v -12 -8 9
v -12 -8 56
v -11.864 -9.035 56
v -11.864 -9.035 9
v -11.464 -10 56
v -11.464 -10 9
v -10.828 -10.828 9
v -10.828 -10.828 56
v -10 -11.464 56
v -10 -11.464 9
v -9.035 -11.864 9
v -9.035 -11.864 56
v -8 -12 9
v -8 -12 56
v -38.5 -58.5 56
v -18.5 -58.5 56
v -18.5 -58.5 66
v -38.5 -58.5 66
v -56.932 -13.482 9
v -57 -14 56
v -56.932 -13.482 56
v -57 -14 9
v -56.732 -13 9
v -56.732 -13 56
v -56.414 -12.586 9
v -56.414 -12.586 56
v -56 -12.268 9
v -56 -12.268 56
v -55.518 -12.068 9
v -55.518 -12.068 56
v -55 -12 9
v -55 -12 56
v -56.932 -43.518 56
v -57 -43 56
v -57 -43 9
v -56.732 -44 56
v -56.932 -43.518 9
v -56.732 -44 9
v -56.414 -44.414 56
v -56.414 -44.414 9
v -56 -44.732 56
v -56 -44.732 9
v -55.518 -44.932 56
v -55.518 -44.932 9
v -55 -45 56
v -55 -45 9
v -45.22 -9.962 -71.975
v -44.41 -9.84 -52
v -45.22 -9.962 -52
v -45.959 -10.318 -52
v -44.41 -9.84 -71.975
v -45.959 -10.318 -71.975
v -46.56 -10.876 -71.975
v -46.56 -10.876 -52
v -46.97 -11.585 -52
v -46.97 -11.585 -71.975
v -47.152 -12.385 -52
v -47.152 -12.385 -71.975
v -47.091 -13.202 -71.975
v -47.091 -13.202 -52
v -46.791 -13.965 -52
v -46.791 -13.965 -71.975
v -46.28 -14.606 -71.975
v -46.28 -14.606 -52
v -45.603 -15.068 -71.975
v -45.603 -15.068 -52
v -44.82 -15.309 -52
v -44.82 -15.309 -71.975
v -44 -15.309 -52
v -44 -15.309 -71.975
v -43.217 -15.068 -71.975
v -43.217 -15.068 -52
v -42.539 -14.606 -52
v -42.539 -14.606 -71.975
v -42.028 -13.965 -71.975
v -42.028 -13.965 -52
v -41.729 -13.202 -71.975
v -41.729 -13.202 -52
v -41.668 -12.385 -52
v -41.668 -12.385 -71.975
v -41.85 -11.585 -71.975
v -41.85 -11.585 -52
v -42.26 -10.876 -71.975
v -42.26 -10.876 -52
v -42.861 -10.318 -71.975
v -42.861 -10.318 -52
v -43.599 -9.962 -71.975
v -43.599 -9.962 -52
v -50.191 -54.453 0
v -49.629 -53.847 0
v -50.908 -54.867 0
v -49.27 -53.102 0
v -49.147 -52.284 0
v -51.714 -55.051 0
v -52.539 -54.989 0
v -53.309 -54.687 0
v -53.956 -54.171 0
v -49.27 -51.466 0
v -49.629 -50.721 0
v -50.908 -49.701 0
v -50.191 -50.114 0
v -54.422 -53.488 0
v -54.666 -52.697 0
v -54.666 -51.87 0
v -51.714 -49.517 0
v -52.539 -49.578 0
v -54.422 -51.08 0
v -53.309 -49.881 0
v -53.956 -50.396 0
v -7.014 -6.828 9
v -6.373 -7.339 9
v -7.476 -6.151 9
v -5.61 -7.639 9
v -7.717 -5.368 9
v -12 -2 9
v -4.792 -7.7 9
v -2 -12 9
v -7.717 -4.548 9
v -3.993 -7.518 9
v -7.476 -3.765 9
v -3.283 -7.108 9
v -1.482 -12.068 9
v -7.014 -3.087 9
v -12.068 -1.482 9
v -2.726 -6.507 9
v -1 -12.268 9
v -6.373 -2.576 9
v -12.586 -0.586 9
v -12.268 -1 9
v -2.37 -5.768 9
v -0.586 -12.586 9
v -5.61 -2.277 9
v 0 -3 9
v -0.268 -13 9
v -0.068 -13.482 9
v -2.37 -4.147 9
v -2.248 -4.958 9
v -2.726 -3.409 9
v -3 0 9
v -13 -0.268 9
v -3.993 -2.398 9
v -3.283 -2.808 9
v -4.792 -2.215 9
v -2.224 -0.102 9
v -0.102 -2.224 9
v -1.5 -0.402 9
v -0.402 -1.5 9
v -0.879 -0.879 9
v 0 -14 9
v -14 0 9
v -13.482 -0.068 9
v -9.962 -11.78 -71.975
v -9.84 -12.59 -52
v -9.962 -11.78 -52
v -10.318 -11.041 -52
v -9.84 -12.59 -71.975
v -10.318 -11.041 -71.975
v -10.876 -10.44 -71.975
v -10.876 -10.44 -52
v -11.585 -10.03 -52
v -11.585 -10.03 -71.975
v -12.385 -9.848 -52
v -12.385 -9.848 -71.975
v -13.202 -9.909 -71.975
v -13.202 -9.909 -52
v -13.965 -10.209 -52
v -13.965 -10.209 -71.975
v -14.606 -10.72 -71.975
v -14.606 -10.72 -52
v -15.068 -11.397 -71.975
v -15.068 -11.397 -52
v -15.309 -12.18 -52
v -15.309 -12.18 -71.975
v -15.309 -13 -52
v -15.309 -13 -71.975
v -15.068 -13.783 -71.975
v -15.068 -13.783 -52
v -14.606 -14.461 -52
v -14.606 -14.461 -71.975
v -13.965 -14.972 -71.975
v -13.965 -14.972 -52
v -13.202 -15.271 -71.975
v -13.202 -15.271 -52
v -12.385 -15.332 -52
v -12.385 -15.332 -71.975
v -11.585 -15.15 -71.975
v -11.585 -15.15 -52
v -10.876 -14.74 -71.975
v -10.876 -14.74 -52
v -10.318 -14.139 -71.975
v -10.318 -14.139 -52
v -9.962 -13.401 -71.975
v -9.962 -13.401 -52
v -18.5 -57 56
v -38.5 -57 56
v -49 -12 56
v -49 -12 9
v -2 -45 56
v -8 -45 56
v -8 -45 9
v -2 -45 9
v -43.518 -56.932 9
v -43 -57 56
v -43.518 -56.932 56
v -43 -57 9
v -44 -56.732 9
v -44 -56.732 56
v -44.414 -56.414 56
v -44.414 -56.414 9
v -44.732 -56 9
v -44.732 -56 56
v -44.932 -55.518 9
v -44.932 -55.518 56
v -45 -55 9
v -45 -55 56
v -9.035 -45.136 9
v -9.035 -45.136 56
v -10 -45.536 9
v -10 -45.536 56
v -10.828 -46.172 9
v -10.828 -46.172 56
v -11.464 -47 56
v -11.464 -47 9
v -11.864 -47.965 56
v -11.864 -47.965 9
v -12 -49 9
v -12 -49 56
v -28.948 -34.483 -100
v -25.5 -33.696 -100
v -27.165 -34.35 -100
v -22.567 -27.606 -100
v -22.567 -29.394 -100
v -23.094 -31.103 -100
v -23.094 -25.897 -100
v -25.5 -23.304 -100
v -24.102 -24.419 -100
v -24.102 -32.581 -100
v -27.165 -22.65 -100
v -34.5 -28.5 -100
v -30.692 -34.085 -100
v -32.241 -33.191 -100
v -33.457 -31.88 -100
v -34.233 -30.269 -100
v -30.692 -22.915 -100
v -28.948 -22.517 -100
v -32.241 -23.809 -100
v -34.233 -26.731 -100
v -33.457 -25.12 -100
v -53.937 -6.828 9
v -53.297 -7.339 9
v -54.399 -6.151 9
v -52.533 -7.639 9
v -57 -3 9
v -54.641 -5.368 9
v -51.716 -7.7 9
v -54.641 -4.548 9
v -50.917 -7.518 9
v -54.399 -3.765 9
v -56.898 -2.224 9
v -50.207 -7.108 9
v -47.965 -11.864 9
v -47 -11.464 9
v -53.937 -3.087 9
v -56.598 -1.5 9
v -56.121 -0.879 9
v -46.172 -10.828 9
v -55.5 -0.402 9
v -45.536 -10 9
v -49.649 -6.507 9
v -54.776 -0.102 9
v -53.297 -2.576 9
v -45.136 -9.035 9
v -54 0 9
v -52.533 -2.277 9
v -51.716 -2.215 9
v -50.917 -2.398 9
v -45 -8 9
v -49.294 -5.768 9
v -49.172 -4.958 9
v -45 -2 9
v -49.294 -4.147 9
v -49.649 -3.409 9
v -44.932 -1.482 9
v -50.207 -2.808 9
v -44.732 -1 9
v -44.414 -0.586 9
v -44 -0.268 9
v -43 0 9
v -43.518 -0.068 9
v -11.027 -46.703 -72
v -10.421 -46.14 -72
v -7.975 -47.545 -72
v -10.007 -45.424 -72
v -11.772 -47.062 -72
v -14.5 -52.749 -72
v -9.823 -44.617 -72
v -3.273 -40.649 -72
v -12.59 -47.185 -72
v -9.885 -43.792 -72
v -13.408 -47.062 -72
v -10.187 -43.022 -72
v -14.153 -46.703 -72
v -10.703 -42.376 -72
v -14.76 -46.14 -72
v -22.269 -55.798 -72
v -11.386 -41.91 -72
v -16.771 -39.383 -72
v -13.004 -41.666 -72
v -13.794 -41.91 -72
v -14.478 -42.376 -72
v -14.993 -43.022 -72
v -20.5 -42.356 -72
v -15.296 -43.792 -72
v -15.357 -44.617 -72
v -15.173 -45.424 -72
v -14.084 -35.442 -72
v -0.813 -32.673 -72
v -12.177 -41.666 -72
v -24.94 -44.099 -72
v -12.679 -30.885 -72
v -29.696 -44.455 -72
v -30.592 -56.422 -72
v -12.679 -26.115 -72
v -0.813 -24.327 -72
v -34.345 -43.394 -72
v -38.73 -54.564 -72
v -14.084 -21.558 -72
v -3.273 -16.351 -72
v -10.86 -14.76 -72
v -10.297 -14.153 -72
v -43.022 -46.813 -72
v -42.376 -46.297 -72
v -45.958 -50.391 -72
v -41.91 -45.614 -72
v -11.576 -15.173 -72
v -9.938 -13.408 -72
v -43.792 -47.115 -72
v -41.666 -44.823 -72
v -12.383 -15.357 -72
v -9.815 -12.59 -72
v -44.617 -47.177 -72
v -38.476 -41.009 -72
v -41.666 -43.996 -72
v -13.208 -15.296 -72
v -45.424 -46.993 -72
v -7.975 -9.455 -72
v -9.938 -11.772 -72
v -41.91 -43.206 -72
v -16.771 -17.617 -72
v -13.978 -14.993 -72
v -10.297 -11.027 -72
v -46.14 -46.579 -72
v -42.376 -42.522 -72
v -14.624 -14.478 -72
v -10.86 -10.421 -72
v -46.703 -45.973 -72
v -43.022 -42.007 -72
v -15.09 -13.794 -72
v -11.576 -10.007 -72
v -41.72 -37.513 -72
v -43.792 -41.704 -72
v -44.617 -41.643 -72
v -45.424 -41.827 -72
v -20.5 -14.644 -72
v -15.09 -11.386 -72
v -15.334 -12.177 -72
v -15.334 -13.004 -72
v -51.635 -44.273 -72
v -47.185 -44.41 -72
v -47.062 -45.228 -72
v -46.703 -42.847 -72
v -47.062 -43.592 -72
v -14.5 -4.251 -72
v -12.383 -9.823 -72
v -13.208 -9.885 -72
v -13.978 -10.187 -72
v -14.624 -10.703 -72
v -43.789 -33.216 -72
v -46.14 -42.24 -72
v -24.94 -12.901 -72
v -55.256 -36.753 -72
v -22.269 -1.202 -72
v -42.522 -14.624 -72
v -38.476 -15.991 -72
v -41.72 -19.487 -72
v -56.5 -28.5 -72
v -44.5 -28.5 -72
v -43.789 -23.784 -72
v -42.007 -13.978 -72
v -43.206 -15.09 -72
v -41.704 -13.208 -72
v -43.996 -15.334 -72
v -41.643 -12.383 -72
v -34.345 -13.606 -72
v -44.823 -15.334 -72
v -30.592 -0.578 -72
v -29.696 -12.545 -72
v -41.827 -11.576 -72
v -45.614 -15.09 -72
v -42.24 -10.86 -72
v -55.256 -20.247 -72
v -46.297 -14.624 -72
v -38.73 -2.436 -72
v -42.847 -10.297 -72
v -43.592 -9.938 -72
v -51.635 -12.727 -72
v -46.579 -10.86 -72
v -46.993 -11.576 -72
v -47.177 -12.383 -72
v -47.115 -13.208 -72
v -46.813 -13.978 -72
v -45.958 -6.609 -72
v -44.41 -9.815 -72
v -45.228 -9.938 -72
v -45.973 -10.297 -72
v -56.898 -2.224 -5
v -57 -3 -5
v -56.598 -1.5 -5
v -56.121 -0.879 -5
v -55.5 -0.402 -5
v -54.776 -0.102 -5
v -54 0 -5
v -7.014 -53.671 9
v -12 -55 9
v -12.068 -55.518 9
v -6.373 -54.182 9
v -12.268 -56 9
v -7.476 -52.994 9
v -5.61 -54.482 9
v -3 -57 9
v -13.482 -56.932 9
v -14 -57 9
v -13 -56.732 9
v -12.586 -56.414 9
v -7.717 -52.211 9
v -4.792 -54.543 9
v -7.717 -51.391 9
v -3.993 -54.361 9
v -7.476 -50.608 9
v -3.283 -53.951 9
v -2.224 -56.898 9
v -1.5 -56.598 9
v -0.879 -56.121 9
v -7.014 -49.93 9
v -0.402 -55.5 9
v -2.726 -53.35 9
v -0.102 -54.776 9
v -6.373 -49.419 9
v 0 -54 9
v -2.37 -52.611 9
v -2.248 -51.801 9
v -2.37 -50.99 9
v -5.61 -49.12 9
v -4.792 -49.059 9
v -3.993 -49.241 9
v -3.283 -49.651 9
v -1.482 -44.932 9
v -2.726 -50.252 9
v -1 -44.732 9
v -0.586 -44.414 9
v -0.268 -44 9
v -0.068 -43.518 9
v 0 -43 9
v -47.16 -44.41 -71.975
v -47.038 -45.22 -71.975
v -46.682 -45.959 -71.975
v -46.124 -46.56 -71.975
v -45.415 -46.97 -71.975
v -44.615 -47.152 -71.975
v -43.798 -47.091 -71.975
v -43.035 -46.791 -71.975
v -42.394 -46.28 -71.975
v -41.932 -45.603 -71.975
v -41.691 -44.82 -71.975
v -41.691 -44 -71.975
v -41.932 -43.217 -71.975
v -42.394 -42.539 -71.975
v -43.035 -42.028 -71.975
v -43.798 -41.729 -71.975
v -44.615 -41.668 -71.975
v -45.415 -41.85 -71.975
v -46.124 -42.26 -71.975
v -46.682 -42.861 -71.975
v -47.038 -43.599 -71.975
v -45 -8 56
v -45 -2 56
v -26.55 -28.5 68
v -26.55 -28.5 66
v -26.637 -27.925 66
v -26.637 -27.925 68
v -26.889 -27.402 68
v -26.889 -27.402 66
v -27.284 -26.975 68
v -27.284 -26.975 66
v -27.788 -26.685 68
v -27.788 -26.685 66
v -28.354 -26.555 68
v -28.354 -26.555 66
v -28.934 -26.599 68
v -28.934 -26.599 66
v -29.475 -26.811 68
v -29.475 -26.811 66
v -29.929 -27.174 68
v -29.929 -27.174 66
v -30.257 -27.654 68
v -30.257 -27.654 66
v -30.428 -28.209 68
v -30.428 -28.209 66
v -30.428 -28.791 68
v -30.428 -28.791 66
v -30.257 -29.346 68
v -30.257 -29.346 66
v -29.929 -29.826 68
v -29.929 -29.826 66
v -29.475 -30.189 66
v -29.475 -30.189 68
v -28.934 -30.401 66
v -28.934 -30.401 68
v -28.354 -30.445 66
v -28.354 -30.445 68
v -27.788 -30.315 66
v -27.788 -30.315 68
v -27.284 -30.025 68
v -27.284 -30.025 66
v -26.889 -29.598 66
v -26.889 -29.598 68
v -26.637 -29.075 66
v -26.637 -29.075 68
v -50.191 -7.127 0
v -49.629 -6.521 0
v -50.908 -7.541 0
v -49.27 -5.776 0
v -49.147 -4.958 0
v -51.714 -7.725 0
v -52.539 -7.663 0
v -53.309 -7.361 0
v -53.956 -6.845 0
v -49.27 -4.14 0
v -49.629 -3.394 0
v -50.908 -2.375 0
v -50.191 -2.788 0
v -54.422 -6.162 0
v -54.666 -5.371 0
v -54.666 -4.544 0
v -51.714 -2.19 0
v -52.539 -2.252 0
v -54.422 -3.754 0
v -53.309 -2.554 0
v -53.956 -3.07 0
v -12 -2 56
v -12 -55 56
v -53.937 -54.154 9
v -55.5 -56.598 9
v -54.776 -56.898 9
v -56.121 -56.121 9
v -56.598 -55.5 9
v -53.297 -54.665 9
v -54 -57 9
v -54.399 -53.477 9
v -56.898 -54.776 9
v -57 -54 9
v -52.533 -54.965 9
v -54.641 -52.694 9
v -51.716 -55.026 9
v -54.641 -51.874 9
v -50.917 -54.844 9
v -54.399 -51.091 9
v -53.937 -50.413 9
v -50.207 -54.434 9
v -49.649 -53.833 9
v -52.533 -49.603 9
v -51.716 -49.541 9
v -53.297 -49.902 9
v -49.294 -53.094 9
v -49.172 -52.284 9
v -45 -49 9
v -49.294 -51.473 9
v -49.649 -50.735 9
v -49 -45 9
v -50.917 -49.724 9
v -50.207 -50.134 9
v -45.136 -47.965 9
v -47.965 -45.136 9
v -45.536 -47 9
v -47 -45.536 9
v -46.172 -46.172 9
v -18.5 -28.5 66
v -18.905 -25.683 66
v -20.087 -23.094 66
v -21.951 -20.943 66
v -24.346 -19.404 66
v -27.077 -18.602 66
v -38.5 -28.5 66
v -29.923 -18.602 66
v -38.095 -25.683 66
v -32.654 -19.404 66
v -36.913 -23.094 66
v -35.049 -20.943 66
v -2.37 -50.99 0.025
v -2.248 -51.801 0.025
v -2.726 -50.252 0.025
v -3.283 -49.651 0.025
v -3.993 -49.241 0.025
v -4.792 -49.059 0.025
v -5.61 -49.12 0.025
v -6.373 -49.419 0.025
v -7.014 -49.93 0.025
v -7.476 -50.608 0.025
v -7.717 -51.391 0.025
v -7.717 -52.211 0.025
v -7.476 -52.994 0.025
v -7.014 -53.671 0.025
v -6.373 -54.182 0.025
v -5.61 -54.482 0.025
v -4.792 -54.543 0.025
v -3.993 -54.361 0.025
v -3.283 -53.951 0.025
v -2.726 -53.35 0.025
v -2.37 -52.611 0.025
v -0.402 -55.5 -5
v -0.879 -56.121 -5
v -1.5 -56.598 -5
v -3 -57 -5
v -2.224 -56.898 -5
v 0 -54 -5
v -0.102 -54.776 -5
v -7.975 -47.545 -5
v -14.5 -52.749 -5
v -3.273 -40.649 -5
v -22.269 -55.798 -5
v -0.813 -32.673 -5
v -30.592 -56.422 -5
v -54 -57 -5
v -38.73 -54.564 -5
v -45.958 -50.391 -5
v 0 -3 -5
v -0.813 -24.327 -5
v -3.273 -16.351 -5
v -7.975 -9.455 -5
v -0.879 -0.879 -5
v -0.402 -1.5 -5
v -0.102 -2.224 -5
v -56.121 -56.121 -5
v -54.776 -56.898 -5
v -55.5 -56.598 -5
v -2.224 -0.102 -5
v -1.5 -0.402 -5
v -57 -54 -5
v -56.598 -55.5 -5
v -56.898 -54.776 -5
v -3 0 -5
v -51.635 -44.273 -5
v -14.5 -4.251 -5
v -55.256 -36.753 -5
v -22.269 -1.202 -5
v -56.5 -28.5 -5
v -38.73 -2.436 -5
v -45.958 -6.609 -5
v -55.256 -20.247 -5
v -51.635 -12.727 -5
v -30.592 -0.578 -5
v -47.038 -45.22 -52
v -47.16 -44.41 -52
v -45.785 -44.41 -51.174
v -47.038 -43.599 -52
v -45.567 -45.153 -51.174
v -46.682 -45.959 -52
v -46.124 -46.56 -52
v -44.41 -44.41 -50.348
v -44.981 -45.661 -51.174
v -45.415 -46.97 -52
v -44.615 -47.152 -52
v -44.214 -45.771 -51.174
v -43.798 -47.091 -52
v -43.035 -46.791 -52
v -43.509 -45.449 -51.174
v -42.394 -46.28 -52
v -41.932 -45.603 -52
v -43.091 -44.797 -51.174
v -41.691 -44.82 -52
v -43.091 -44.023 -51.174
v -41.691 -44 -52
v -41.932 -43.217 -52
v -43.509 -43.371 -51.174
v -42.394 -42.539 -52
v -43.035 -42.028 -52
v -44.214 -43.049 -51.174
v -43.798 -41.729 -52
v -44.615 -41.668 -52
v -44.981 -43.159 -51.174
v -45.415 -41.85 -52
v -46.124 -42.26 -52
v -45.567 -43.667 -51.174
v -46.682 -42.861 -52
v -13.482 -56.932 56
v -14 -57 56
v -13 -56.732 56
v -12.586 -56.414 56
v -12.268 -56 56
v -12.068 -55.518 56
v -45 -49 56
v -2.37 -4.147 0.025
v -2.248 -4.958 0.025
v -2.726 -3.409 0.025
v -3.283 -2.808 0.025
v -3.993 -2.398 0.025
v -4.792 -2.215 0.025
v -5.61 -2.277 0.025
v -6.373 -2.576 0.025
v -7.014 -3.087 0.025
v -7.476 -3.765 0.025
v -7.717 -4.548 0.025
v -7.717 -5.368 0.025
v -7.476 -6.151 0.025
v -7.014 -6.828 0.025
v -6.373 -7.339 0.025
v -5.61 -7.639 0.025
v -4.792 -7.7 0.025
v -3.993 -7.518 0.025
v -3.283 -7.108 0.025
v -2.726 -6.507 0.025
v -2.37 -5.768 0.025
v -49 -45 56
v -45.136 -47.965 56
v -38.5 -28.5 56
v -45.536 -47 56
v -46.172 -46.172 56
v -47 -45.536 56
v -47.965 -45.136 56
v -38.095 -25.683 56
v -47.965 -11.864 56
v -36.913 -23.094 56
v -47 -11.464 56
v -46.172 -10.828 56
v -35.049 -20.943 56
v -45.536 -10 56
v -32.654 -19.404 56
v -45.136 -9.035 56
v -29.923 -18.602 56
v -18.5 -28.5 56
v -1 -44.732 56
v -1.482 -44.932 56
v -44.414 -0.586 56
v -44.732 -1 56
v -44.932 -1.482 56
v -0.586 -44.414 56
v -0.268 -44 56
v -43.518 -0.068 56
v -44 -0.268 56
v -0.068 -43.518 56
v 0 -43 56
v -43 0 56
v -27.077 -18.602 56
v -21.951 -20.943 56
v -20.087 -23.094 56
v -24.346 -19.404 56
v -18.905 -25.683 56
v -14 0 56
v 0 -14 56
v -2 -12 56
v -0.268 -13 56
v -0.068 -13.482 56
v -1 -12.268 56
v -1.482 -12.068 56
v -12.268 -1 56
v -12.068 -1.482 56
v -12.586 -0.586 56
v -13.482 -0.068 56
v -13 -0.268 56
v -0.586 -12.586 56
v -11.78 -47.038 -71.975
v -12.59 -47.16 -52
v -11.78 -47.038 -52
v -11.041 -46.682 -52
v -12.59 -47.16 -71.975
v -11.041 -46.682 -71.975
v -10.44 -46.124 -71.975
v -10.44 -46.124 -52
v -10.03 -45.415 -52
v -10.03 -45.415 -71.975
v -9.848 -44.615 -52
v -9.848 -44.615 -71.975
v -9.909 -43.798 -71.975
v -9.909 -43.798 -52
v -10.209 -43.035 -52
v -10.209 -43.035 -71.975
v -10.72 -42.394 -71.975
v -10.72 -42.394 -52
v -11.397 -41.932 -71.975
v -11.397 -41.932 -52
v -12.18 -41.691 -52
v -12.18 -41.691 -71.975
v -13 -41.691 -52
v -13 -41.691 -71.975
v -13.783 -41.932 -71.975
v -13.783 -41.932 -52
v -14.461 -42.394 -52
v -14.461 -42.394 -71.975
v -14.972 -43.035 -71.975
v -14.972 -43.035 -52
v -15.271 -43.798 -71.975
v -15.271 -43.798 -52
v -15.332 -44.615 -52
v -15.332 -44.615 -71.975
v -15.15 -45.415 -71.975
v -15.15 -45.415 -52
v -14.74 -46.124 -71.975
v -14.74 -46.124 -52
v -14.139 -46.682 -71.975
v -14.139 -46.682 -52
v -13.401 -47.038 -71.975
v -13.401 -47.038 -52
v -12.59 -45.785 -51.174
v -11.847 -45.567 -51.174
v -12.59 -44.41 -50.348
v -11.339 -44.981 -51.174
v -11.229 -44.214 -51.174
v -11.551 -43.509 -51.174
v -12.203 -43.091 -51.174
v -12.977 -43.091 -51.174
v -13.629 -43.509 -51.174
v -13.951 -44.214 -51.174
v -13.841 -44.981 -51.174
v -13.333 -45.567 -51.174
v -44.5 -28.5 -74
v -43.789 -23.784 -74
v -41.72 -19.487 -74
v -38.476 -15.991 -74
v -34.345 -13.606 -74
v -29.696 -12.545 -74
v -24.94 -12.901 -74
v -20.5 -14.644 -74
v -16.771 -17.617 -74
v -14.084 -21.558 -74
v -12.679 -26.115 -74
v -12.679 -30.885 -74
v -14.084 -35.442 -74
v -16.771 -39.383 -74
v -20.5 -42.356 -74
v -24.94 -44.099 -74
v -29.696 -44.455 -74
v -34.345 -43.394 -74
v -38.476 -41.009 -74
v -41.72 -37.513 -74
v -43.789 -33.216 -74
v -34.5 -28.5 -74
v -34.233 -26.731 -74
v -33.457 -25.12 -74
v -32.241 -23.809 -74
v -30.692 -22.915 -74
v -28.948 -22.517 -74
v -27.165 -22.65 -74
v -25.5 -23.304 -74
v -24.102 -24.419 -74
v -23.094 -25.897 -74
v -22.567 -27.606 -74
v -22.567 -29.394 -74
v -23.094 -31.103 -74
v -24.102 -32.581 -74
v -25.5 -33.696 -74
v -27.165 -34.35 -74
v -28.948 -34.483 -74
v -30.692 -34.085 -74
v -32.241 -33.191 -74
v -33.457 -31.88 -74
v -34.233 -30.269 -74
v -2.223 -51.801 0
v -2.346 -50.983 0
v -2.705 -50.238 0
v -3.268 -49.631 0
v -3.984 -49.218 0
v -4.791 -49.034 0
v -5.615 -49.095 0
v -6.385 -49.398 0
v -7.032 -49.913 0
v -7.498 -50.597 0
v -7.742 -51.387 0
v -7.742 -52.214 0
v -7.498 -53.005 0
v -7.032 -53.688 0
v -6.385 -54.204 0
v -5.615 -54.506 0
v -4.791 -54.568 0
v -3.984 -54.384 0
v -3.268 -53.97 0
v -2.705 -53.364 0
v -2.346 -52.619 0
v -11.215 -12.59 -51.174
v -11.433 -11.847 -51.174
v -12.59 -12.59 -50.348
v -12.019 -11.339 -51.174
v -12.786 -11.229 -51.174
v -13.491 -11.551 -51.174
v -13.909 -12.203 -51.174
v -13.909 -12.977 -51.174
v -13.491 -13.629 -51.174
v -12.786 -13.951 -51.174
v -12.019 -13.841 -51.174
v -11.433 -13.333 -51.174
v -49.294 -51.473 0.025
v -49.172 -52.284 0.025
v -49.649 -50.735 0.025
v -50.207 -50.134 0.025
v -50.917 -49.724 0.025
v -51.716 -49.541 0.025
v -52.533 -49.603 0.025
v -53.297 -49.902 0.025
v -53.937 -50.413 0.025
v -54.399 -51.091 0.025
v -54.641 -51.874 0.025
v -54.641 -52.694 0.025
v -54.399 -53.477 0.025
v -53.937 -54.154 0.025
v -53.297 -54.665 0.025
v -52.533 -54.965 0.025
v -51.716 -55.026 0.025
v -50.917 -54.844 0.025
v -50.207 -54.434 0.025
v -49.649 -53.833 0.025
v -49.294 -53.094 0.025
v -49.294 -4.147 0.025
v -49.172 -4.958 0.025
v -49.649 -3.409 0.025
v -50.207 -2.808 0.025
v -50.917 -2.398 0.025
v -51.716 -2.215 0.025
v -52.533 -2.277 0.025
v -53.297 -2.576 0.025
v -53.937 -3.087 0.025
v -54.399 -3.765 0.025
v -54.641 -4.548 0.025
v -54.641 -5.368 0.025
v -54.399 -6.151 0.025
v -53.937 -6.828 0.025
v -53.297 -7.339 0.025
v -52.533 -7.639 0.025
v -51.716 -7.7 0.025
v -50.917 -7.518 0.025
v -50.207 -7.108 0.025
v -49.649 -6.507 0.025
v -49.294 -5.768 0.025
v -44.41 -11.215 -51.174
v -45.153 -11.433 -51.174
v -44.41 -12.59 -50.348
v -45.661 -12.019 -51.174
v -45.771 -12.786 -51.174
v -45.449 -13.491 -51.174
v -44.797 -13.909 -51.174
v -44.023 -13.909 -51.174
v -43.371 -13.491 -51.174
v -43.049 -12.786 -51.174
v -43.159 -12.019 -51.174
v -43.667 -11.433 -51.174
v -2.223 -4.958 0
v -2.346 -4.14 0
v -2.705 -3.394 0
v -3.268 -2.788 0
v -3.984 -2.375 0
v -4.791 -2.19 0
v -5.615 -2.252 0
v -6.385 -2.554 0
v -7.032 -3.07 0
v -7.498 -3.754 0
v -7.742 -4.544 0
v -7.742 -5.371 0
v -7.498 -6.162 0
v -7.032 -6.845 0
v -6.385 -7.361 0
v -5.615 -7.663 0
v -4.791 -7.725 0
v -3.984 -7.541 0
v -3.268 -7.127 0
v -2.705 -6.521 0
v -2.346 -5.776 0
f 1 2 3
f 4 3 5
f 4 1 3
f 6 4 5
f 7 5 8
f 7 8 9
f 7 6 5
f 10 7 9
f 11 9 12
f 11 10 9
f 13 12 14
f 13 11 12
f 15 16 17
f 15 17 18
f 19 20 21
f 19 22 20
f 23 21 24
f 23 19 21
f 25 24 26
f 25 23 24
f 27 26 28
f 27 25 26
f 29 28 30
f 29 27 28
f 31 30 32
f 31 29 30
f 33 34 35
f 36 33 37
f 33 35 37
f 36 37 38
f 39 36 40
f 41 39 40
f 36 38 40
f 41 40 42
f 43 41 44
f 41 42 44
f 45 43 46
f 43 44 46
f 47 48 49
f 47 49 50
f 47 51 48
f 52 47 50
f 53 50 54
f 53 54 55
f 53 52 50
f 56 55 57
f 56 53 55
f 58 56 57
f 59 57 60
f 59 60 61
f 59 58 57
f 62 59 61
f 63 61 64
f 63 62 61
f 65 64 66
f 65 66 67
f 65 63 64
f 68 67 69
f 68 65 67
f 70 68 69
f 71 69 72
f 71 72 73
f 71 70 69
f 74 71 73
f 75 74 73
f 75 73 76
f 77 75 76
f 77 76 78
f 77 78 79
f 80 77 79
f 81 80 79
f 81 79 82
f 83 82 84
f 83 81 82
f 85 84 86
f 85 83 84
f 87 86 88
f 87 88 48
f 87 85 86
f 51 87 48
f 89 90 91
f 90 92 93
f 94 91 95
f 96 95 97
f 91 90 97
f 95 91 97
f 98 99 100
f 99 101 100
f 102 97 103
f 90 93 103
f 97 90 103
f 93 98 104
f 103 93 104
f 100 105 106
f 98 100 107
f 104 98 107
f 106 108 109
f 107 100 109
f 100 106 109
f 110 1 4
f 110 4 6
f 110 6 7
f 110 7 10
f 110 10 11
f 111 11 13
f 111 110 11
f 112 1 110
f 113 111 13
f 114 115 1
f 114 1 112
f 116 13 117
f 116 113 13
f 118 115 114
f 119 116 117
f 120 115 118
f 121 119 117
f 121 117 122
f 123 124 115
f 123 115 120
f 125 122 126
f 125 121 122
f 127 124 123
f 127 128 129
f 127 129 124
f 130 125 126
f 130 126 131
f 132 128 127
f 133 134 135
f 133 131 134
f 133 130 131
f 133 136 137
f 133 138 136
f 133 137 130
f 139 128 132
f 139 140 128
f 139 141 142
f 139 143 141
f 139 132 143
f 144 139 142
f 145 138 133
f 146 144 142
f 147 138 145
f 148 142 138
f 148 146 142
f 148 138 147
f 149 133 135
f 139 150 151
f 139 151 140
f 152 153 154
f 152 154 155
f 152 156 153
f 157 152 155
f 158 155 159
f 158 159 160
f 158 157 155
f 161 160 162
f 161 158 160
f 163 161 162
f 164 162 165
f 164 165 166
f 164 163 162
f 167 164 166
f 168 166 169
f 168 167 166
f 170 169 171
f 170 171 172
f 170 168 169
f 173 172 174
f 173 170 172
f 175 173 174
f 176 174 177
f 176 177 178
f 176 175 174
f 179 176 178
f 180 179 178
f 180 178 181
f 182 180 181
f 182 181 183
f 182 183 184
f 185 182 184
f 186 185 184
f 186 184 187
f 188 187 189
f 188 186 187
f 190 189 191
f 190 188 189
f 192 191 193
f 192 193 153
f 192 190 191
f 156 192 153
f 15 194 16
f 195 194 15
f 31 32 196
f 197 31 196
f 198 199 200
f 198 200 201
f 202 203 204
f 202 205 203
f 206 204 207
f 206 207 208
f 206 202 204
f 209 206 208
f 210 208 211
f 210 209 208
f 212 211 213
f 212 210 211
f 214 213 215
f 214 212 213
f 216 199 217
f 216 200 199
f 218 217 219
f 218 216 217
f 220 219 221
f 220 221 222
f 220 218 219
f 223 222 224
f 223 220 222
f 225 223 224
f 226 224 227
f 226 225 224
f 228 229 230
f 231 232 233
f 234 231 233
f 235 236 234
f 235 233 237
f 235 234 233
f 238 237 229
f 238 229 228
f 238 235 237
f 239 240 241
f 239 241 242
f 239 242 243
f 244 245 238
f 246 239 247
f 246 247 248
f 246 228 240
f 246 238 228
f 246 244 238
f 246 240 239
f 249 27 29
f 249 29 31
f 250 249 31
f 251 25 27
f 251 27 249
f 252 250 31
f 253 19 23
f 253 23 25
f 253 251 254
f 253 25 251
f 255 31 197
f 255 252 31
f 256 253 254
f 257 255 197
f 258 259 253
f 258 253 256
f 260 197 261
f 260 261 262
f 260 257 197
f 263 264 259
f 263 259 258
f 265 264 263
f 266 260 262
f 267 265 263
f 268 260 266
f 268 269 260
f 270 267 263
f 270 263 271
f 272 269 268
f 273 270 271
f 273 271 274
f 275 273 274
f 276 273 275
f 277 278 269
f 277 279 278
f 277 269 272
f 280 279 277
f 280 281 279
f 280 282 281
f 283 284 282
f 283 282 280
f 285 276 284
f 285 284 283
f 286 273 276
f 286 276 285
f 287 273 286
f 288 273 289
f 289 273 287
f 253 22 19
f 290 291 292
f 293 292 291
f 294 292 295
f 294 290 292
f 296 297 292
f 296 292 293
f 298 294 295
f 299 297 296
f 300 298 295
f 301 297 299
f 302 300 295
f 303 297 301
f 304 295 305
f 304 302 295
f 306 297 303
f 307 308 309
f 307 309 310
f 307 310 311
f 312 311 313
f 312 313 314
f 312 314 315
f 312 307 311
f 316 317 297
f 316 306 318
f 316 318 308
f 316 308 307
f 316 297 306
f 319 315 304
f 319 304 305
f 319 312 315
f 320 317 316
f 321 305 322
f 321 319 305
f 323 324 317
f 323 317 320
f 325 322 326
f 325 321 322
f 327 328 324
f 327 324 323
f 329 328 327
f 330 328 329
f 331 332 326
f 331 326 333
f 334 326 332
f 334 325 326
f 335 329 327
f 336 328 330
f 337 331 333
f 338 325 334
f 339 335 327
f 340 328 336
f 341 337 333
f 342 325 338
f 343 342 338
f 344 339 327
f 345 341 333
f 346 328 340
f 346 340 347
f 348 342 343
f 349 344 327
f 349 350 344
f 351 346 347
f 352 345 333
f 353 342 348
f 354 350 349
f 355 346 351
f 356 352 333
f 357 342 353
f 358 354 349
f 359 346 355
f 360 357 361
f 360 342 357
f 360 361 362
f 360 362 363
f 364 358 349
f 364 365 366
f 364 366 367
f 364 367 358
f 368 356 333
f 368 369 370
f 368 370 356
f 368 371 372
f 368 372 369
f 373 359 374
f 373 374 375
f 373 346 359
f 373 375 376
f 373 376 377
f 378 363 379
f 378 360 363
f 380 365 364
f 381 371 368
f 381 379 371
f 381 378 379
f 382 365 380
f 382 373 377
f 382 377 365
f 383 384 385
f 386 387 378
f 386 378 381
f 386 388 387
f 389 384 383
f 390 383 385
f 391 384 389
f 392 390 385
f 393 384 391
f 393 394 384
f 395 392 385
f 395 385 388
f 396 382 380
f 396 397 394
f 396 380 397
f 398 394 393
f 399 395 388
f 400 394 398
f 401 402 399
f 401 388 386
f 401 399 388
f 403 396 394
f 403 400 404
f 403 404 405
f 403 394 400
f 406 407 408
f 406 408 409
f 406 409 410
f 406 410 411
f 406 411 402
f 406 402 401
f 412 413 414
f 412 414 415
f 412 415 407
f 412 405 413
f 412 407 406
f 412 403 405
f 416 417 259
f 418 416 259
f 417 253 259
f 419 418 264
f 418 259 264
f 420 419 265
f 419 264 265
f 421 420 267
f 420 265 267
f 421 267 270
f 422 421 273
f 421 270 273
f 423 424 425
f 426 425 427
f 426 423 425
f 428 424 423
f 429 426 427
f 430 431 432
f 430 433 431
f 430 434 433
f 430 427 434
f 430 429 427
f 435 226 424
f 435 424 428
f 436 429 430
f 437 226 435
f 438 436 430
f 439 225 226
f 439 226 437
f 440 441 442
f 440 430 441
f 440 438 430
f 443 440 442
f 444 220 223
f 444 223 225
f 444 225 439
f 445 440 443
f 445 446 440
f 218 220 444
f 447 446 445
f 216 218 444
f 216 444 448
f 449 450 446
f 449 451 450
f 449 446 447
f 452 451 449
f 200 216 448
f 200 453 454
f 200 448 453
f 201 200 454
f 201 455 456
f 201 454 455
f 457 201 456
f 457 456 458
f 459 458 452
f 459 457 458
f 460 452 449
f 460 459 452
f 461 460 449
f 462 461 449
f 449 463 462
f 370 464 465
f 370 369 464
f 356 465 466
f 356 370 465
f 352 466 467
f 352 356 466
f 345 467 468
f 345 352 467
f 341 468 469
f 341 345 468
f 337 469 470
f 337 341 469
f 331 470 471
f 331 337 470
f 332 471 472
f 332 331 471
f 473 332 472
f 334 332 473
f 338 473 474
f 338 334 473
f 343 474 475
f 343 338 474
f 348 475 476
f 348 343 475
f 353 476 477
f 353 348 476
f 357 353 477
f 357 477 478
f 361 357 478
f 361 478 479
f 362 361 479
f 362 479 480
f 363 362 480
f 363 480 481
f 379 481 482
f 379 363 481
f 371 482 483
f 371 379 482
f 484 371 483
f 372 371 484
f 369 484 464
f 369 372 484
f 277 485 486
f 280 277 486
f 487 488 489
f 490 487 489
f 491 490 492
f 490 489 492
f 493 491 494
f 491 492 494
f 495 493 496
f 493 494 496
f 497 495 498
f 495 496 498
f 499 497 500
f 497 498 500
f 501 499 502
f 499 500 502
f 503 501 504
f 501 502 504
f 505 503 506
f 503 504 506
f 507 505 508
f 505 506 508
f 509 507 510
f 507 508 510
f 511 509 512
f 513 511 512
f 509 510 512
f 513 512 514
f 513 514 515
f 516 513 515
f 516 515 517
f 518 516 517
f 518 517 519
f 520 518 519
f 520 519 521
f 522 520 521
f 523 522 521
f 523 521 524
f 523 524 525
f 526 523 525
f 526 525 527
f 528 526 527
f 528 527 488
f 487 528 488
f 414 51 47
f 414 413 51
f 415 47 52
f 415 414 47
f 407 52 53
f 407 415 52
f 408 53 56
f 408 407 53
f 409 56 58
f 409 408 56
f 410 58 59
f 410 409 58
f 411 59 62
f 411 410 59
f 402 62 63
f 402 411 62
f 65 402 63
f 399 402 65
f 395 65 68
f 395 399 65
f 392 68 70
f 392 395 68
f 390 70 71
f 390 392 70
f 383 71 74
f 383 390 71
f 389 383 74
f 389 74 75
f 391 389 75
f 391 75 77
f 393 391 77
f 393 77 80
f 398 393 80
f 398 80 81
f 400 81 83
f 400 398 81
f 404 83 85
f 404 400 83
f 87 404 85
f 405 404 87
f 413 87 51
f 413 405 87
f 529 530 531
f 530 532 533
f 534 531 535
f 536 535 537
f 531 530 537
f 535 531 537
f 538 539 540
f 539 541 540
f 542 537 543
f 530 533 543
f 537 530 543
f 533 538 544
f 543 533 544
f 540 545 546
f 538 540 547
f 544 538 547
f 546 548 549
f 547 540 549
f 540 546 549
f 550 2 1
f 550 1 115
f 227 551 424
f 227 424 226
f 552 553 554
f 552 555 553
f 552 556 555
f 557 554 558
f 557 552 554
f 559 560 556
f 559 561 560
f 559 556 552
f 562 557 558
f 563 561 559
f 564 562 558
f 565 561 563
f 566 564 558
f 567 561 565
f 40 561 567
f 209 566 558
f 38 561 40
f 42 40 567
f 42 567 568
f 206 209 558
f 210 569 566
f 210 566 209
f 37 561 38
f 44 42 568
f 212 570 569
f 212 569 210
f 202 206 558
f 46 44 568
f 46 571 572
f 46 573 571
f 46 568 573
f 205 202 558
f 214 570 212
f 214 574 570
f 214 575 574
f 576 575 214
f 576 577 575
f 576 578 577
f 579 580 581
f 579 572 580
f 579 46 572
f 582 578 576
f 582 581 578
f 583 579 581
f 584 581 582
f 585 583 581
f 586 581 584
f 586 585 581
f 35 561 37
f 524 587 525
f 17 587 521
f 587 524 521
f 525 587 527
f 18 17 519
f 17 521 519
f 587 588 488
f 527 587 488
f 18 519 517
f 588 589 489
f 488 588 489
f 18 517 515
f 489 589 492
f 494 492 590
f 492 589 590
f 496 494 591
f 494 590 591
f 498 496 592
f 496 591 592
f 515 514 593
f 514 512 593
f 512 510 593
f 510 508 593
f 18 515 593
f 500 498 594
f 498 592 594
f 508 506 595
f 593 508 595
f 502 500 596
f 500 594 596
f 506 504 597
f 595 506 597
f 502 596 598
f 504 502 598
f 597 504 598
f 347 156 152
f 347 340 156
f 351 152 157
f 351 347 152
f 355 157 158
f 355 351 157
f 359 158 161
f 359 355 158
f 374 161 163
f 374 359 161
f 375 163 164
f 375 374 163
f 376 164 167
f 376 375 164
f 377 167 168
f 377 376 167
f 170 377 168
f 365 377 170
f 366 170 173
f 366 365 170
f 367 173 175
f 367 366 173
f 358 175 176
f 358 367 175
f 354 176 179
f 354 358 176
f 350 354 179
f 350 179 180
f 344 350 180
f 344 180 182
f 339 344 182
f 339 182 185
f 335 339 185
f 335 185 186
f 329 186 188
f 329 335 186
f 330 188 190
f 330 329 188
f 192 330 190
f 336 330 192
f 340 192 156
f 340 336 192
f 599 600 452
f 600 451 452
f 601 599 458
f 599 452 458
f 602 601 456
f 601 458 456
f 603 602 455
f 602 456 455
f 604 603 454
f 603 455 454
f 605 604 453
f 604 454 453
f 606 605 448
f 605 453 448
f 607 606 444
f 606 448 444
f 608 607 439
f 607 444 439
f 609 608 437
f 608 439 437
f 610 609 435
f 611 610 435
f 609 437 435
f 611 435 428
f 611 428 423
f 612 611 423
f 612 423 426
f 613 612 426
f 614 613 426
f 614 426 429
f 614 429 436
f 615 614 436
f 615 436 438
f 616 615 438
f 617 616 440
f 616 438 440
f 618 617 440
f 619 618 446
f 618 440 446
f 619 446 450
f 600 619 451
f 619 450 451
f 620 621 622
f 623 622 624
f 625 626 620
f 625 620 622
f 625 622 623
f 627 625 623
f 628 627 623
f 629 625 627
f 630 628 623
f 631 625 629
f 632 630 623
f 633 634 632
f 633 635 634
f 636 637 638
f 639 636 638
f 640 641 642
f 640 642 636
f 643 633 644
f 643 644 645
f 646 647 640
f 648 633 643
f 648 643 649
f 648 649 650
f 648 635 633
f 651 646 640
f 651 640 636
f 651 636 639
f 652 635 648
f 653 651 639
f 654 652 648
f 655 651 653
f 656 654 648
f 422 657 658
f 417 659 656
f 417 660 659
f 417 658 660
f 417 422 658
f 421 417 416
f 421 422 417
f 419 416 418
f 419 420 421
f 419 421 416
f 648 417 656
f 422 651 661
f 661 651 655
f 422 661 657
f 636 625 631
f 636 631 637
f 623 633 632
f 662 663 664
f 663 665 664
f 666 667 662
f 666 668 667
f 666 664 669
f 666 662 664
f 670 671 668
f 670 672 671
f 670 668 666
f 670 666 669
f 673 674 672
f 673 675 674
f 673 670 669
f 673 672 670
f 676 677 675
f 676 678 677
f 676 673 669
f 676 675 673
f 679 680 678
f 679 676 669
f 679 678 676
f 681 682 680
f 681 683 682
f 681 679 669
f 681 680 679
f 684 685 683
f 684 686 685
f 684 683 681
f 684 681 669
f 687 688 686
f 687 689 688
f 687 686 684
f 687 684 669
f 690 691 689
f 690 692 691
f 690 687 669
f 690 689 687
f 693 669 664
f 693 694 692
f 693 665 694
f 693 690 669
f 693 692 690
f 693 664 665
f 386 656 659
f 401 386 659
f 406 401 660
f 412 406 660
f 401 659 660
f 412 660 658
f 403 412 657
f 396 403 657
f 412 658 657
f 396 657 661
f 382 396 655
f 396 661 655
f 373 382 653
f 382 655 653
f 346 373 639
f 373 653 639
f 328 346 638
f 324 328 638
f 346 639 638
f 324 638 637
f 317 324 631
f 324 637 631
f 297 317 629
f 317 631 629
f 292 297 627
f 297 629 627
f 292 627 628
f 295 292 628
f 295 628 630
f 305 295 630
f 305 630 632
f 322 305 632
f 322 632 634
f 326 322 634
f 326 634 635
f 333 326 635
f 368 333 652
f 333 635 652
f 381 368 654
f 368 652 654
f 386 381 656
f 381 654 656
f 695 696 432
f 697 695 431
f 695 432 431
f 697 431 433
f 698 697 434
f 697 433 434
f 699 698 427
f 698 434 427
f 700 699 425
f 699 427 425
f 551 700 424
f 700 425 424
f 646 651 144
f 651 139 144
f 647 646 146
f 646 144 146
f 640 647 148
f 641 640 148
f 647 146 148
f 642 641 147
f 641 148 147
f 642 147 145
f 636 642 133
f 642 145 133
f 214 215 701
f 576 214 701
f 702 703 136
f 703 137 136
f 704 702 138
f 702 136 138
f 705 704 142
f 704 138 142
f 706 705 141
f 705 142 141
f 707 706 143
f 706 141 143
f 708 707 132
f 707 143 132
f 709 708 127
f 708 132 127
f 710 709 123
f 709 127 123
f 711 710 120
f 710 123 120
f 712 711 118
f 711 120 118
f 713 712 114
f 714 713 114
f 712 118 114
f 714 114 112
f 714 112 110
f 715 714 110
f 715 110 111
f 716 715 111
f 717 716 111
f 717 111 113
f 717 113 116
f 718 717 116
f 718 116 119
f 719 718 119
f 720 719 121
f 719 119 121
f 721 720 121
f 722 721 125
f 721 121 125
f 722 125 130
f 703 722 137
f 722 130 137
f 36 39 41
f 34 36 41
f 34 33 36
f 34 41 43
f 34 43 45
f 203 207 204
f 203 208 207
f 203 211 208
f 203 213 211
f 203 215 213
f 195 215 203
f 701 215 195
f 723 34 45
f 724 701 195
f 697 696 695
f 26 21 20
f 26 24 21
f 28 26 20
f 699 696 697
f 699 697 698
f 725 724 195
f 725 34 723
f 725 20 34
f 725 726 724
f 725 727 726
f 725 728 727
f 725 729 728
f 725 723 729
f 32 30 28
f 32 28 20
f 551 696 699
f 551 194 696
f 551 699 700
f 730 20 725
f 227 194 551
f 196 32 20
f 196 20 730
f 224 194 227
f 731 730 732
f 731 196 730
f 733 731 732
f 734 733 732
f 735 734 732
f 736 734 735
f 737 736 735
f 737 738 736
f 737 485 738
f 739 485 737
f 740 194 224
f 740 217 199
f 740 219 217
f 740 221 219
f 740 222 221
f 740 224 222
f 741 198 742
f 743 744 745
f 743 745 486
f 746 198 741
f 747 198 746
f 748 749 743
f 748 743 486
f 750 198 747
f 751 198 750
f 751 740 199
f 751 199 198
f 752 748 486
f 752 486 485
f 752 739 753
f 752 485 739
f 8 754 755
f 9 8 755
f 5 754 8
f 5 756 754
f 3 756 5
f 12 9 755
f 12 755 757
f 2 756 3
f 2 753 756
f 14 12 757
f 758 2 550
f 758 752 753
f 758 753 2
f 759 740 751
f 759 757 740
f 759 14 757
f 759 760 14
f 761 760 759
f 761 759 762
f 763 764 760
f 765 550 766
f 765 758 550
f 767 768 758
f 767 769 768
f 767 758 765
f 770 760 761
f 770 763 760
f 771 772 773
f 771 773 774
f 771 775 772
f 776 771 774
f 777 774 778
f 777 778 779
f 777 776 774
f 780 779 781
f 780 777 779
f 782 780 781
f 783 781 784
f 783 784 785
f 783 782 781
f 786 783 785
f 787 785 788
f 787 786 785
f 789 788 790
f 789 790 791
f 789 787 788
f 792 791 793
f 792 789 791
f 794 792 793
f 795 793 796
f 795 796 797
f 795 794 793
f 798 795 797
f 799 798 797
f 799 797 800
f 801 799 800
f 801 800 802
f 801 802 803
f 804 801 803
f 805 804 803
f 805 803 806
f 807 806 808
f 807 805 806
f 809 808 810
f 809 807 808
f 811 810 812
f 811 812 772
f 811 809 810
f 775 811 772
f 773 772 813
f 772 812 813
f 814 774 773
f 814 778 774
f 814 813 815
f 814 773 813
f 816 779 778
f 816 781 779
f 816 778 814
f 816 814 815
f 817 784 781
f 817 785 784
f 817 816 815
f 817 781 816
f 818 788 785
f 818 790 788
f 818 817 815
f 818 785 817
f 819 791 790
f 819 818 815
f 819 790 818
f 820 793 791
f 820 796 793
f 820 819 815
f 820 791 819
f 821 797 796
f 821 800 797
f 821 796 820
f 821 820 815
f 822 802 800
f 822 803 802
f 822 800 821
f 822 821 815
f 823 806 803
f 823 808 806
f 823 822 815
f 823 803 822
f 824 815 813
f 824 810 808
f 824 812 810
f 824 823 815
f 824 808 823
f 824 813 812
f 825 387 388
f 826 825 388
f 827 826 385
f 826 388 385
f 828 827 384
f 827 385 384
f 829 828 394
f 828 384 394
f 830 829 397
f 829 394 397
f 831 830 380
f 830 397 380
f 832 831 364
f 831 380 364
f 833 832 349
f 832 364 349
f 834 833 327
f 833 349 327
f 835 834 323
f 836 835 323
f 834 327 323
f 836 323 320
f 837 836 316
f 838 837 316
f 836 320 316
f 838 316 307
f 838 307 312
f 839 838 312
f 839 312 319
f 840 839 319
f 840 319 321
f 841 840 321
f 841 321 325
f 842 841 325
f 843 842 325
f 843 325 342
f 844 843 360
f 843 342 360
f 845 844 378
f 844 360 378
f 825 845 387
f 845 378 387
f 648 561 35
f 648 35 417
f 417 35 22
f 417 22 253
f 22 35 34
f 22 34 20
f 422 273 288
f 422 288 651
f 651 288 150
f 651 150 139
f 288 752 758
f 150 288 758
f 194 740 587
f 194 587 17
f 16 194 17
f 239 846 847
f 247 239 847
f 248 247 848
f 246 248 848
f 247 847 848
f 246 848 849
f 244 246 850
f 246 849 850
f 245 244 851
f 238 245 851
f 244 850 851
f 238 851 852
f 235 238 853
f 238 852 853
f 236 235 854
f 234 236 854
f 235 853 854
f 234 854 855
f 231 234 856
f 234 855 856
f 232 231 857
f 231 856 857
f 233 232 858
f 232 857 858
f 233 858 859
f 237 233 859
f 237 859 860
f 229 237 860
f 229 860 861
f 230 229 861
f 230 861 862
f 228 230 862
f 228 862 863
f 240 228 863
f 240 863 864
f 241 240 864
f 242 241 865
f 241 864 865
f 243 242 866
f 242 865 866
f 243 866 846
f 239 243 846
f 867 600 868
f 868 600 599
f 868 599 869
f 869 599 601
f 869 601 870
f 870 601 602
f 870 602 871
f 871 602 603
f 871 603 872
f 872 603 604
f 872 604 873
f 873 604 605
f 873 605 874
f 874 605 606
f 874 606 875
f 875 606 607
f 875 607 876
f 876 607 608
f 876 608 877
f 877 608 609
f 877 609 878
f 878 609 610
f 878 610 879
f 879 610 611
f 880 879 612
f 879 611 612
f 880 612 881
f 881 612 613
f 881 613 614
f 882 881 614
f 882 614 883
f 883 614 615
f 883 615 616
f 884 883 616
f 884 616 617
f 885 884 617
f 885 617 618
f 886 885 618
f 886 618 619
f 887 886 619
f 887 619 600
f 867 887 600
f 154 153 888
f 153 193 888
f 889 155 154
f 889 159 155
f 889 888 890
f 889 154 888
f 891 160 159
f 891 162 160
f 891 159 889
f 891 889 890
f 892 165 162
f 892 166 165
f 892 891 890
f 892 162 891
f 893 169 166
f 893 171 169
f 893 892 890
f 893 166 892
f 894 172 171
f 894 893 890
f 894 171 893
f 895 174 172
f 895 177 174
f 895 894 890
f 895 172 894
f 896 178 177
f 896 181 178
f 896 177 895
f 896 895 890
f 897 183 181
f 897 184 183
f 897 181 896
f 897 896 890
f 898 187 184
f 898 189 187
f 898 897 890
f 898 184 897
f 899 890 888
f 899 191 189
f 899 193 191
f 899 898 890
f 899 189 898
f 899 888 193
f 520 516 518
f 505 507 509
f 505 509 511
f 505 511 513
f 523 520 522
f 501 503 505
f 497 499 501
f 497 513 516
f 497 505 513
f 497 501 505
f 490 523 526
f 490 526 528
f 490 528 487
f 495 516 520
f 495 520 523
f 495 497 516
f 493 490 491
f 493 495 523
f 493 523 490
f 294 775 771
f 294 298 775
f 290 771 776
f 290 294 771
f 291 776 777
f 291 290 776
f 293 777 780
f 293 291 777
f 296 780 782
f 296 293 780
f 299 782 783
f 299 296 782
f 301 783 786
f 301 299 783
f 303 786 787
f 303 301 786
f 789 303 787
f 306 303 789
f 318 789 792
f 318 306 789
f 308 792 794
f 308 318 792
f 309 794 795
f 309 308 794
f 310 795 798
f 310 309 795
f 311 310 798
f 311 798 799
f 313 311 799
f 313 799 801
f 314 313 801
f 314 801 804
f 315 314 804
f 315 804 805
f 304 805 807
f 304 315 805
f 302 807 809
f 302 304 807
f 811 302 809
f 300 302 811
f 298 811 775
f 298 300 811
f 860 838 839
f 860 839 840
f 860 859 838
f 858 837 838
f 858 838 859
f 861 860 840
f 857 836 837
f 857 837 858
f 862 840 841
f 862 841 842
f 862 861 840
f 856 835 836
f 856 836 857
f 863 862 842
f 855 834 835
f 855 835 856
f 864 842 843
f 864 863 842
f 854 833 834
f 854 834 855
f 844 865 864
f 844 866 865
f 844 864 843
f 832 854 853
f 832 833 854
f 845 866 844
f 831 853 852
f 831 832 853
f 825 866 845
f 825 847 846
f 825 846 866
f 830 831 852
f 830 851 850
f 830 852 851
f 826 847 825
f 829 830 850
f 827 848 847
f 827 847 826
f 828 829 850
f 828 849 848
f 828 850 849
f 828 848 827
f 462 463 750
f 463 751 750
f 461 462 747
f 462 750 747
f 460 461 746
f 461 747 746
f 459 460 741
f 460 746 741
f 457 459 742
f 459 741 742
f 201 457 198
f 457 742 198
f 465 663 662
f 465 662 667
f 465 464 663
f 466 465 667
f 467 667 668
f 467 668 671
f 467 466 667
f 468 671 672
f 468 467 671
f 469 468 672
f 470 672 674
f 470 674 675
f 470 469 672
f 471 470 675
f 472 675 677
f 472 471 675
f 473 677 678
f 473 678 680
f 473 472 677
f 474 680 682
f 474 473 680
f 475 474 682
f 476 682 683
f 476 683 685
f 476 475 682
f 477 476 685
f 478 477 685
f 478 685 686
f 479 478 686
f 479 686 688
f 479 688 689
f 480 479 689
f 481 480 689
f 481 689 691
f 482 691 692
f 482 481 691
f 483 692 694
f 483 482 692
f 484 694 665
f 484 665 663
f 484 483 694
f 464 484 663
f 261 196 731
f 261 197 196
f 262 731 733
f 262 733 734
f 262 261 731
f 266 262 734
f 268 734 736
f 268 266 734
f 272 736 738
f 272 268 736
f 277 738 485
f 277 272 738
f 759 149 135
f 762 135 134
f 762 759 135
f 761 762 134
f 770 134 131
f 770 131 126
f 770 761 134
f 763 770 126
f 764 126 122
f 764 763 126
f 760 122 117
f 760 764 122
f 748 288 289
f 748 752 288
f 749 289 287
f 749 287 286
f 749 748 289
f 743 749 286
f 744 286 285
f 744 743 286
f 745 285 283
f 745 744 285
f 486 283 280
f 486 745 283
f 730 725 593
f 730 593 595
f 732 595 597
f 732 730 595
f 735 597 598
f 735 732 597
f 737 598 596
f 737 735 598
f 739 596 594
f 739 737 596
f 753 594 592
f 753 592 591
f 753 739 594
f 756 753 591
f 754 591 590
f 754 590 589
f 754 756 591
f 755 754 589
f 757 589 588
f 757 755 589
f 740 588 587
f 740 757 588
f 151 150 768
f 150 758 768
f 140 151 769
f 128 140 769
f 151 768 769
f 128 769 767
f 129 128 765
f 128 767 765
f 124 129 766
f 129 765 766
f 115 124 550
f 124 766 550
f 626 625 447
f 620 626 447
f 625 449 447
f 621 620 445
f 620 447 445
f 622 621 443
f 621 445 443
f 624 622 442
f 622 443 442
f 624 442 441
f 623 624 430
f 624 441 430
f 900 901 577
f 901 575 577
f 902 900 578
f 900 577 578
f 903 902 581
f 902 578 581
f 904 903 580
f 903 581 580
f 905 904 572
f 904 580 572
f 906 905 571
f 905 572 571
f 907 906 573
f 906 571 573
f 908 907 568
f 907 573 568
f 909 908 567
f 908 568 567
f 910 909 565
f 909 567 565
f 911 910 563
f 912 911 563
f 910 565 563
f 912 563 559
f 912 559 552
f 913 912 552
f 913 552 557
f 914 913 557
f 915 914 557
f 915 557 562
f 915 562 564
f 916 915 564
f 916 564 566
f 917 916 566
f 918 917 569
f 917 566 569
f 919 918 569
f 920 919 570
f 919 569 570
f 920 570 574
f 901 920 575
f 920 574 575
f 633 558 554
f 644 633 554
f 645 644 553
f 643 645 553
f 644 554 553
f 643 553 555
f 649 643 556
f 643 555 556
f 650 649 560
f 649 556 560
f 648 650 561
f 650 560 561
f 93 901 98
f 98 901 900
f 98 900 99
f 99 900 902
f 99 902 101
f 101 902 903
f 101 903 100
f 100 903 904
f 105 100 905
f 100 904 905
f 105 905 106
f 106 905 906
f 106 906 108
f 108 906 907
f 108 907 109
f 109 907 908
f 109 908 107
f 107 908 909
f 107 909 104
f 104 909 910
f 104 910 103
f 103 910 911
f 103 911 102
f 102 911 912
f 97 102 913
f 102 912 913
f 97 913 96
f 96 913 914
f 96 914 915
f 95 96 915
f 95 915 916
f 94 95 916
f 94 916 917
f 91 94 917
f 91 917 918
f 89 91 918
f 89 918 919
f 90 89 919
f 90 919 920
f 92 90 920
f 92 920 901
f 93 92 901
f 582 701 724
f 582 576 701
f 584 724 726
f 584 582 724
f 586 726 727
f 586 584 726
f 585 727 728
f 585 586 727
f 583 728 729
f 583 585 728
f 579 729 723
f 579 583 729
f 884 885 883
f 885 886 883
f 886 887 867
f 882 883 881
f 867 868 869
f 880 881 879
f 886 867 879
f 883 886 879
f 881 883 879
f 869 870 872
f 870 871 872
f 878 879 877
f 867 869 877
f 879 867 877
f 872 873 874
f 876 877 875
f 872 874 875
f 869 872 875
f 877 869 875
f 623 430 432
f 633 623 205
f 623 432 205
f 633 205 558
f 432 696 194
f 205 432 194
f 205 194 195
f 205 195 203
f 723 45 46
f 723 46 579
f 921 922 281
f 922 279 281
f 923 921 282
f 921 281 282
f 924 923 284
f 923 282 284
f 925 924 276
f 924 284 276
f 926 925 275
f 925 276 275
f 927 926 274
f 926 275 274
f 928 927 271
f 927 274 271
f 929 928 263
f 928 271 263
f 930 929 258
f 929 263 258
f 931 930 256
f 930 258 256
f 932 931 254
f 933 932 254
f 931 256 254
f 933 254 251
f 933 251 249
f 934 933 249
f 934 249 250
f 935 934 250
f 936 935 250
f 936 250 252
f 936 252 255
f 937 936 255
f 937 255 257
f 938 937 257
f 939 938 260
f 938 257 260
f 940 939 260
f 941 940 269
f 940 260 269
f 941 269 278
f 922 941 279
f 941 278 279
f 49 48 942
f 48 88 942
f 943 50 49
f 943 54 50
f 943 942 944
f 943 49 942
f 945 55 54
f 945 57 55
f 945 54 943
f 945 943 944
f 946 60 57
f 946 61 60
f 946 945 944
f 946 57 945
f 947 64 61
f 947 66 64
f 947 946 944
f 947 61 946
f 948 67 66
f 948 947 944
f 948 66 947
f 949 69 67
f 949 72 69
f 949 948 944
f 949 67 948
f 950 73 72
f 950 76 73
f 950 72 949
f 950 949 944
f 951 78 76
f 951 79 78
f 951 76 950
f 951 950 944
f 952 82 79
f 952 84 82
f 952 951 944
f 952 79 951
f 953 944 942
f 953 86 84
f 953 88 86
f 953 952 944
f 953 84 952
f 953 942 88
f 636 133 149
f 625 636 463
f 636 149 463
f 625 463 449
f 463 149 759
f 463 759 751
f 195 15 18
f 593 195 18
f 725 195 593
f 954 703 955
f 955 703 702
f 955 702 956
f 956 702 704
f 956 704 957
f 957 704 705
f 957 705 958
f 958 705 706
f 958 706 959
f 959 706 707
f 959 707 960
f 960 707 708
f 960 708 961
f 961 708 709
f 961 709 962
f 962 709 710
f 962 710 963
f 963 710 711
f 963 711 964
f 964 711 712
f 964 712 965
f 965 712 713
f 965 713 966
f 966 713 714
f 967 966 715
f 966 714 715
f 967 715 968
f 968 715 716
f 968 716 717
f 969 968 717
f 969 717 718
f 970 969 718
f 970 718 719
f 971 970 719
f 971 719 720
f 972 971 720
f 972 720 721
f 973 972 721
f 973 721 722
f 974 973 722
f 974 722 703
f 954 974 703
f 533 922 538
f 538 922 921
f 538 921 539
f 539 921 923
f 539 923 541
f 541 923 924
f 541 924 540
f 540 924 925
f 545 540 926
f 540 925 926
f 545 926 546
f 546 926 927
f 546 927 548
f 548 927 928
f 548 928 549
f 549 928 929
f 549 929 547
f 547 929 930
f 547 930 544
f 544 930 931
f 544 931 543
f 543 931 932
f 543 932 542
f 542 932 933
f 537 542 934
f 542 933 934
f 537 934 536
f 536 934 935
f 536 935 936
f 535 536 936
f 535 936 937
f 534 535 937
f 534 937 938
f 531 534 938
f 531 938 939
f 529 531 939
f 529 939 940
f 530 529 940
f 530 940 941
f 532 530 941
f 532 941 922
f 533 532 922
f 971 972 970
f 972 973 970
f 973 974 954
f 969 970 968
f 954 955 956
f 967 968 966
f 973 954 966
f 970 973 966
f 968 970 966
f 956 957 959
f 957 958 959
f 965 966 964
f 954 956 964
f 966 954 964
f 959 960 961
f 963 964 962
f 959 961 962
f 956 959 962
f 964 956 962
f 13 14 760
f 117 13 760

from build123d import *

# Parameters (mm, degrees)
BOSS_EXTRUDE1_DEPTH            = 56
SKETCH2_W                      = 19.654725719
SKETCH2_H                      = 18.883952161
CUT_EXTRUDE1_DEPTH             = 47
FILLET1_R                      = 2
FILLET2_R                      = 4
M5_CLEARANCE_HOLE2_D           = 5.5
M5_CLEARANCE_HOLE2_CSINK_D     = 5.55
M5_CLEARANCE_HOLE2_CSINK_ANGLE = 90
SKETCH6_R                      = 1.95
BOSS_EXTRUDE2_DEPTH            = 12
BOSS_EXTRUDE3_DEPTH            = 5
SKETCH8_R                      = 28
BOSS_EXTRUDE4_DEPTH            = 67
SKETCH9_R                      = 16
BOSS_EXTRUDE5_DEPTH            = 2
CIRPATTERN1_COUNT              = 4
SKETCH14_R                     = 6
BOSS_EXTRUDE6_DEPTH            = 26
SKETCH17_R                     = 1.907386748
BOSS_EXTRUDE7_DEPTH            = 10


with BuildPart() as part:
    # Sketch1 → Boss-Extrude1 (new body)
    with BuildSketch(Plane.XY):
        with BuildLine():
            Line((-3, 0), (-54, 0))
            ThreePointArc((-54, 0), (-56.121320344, -0.878679656), (-57, -3))
            Line((-57, -3), (-57, -54))
            ThreePointArc((-57, -54), (-56.121320344, -56.121320344), (-54, -57))
            Line((-54, -57), (-3, -57))
            ThreePointArc((-3, -57), (-0.878679656, -56.121320344), (0, -54))
            Line((0, -54), (0, -3))
            ThreePointArc((0, -3), (-0.878679656, -0.878679656), (-3, 0))
        make_face()
    extrude(amount=BOSS_EXTRUDE1_DEPTH)

    # Sketch2 → Cut-Extrude1 (cut)
    with BuildSketch(Plane.XY.offset(56)):
        with Locations((-54.827362859, -2.558023919)):
            Rectangle(SKETCH2_W, SKETCH2_H)
        with Locations((-2.17263714, -2.558023919)):
            Rectangle(SKETCH2_W, SKETCH2_H)
        with Locations((-2.17263714, -54.44197608)):
            Rectangle(SKETCH2_W, SKETCH2_H)
        with Locations((-54.827362859, -54.44197608)):
            Rectangle(SKETCH2_W, SKETCH2_H)
    extrude(amount=-CUT_EXTRUDE1_DEPTH, mode=Mode.SUBTRACT)

    # Fillet1
    fillet1_edges = [part.edges().sort_by_distance(p)[0] for p in [
        (-57, -45, 32.5),
        (-45, -57, 32.5),
        (-12, -57, 32.5),
        (0, -45, 32.5),
        (0, -12, 32.5),
        (-12, 0, 32.5),
        (-45, 0, 32.5),
        (-57, -12, 32.5),
    ]]
    fillet(fillet1_edges, radius=FILLET1_R)

    # Fillet2
    fillet2_edges = [part.edges().sort_by_distance(p)[0] for p in [
        (-45, -45, 32.5),
        (-12, -45, 32.5),
        (-12, -12, 32.5),
        (-45, -12, 32.5),
    ]]
    fillet(fillet2_edges, radius=FILLET2_R)

    # M5 Clearance Hole2 (through all)
    with Locations(Plane(origin=(0, 0, 0), x_dir=(-1, 0, 0), z_dir=(0, 0, -1))):
        with Locations((51.921563773, -4.957706516), (4.997949753, -4.957706516), (4.997949753, -51.800834063), (51.921563773, -52.283752904)):
            CounterSinkHole(M5_CLEARANCE_HOLE2_D / 2, M5_CLEARANCE_HOLE2_CSINK_D / 2, counter_sink_angle=M5_CLEARANCE_HOLE2_CSINK_ANGLE)

    # Sketch6 → Boss-Extrude2 (add)
    with BuildSketch(Plane.XY.offset(56)):
        with Locations((-28.5, -28.5)):
            Circle(SKETCH6_R)
    extrude(amount=BOSS_EXTRUDE2_DEPTH)

    # Sketch7 → Boss-Extrude3 (add)
    with BuildSketch(Plane(origin=(0, 0, 0), x_dir=(-1, 0, 0), z_dir=(0, 0, -1))):
        with BuildLine():
            Line((57, -54), (57, -3))
            ThreePointArc((57, -3), (56.121320344, -0.878679656), (54, 0))
            Line((54, 0), (3, 0))
            ThreePointArc((3, 0), (0.878679656, -0.878679656), (0, -3))
            Line((0, -3), (0, -54))
            ThreePointArc((0, -54), (0.878679656, -56.121320344), (3, -57))
            Line((3, -57), (54, -57))
            ThreePointArc((54, -57), (56.121320344, -56.121320344), (57, -54))
        make_face()
    extrude(amount=BOSS_EXTRUDE3_DEPTH)

    # Sketch8 → Boss-Extrude4 (add)
    with BuildSketch(Plane(origin=(0, 0, -5), x_dir=(-1, 0, 0), z_dir=(0, 0, -1))):
        with Locations((28.5, -28.5)):
            Circle(SKETCH8_R)
    extrude(amount=BOSS_EXTRUDE4_DEPTH)

    # Sketch9 → Boss-Extrude5 (add)
    with BuildSketch(Plane(origin=(0, 0, -72), x_dir=(-1, 0, 0), z_dir=(0, 0, -1))):
        with Locations((28.5, -28.5)):
            Circle(SKETCH9_R)
    extrude(amount=BOSS_EXTRUDE5_DEPTH)

    # Sketch13 → M5 Clearance Hole1 (revolve, cut)
    with BuildSketch(Plane(origin=(-44.409902577, -12.590097423, -72), x_dir=(0, 1, 0), z_dir=(1, 0, 0))):
        Polygon((0, 0), (0, 21.652366702), (2.75, 20), (2.75, 0.025), (2.775, 0), align=None)
    m5_clearance_hole1 = revolve(axis=Axis((-44.409902577, -12.590097423, -78.35), (0, 0, 1)), mode=Mode.SUBTRACT)

    # CirPattern1: M5 Clearance Hole1 ×4 about axis
    cirpattern1_axis = Axis((-28.5, -28.5, 0), (0, 0, 1))
    for i in range(1, CIRPATTERN1_COUNT):
        add(m5_clearance_hole1.rotate(cirpattern1_axis, i * 360 / CIRPATTERN1_COUNT), mode=Mode.SUBTRACT)

    # Sketch14 → Boss-Extrude6 (add)
    with BuildSketch(Plane(origin=(0, 0, -74), x_dir=(-1, 0, 0), z_dir=(0, 0, -1))):
        with Locations((28.5, -28.5)):
            Circle(SKETCH14_R)
    extrude(amount=BOSS_EXTRUDE6_DEPTH)

    # Sketch17 → Boss-Extrude7 (add)
    with BuildSketch(Plane.XY.offset(56)):
        with BuildLine():
            Line((-18.5, -28.5), (-18.5, -58.5))
            Line((-18.5, -58.5), (-38.5, -58.5))
            Line((-38.5, -58.5), (-38.5, -28.5))
            ThreePointArc((-38.5, -28.5), (-28.5, -18.5), (-18.5, -28.5))
        make_face()
        with Locations((-28.5, -28.5)):
            Circle(SKETCH17_R, mode=Mode.SUBTRACT)
    extrude(amount=BOSS_EXTRUDE7_DEPTH)


solid = part.part
